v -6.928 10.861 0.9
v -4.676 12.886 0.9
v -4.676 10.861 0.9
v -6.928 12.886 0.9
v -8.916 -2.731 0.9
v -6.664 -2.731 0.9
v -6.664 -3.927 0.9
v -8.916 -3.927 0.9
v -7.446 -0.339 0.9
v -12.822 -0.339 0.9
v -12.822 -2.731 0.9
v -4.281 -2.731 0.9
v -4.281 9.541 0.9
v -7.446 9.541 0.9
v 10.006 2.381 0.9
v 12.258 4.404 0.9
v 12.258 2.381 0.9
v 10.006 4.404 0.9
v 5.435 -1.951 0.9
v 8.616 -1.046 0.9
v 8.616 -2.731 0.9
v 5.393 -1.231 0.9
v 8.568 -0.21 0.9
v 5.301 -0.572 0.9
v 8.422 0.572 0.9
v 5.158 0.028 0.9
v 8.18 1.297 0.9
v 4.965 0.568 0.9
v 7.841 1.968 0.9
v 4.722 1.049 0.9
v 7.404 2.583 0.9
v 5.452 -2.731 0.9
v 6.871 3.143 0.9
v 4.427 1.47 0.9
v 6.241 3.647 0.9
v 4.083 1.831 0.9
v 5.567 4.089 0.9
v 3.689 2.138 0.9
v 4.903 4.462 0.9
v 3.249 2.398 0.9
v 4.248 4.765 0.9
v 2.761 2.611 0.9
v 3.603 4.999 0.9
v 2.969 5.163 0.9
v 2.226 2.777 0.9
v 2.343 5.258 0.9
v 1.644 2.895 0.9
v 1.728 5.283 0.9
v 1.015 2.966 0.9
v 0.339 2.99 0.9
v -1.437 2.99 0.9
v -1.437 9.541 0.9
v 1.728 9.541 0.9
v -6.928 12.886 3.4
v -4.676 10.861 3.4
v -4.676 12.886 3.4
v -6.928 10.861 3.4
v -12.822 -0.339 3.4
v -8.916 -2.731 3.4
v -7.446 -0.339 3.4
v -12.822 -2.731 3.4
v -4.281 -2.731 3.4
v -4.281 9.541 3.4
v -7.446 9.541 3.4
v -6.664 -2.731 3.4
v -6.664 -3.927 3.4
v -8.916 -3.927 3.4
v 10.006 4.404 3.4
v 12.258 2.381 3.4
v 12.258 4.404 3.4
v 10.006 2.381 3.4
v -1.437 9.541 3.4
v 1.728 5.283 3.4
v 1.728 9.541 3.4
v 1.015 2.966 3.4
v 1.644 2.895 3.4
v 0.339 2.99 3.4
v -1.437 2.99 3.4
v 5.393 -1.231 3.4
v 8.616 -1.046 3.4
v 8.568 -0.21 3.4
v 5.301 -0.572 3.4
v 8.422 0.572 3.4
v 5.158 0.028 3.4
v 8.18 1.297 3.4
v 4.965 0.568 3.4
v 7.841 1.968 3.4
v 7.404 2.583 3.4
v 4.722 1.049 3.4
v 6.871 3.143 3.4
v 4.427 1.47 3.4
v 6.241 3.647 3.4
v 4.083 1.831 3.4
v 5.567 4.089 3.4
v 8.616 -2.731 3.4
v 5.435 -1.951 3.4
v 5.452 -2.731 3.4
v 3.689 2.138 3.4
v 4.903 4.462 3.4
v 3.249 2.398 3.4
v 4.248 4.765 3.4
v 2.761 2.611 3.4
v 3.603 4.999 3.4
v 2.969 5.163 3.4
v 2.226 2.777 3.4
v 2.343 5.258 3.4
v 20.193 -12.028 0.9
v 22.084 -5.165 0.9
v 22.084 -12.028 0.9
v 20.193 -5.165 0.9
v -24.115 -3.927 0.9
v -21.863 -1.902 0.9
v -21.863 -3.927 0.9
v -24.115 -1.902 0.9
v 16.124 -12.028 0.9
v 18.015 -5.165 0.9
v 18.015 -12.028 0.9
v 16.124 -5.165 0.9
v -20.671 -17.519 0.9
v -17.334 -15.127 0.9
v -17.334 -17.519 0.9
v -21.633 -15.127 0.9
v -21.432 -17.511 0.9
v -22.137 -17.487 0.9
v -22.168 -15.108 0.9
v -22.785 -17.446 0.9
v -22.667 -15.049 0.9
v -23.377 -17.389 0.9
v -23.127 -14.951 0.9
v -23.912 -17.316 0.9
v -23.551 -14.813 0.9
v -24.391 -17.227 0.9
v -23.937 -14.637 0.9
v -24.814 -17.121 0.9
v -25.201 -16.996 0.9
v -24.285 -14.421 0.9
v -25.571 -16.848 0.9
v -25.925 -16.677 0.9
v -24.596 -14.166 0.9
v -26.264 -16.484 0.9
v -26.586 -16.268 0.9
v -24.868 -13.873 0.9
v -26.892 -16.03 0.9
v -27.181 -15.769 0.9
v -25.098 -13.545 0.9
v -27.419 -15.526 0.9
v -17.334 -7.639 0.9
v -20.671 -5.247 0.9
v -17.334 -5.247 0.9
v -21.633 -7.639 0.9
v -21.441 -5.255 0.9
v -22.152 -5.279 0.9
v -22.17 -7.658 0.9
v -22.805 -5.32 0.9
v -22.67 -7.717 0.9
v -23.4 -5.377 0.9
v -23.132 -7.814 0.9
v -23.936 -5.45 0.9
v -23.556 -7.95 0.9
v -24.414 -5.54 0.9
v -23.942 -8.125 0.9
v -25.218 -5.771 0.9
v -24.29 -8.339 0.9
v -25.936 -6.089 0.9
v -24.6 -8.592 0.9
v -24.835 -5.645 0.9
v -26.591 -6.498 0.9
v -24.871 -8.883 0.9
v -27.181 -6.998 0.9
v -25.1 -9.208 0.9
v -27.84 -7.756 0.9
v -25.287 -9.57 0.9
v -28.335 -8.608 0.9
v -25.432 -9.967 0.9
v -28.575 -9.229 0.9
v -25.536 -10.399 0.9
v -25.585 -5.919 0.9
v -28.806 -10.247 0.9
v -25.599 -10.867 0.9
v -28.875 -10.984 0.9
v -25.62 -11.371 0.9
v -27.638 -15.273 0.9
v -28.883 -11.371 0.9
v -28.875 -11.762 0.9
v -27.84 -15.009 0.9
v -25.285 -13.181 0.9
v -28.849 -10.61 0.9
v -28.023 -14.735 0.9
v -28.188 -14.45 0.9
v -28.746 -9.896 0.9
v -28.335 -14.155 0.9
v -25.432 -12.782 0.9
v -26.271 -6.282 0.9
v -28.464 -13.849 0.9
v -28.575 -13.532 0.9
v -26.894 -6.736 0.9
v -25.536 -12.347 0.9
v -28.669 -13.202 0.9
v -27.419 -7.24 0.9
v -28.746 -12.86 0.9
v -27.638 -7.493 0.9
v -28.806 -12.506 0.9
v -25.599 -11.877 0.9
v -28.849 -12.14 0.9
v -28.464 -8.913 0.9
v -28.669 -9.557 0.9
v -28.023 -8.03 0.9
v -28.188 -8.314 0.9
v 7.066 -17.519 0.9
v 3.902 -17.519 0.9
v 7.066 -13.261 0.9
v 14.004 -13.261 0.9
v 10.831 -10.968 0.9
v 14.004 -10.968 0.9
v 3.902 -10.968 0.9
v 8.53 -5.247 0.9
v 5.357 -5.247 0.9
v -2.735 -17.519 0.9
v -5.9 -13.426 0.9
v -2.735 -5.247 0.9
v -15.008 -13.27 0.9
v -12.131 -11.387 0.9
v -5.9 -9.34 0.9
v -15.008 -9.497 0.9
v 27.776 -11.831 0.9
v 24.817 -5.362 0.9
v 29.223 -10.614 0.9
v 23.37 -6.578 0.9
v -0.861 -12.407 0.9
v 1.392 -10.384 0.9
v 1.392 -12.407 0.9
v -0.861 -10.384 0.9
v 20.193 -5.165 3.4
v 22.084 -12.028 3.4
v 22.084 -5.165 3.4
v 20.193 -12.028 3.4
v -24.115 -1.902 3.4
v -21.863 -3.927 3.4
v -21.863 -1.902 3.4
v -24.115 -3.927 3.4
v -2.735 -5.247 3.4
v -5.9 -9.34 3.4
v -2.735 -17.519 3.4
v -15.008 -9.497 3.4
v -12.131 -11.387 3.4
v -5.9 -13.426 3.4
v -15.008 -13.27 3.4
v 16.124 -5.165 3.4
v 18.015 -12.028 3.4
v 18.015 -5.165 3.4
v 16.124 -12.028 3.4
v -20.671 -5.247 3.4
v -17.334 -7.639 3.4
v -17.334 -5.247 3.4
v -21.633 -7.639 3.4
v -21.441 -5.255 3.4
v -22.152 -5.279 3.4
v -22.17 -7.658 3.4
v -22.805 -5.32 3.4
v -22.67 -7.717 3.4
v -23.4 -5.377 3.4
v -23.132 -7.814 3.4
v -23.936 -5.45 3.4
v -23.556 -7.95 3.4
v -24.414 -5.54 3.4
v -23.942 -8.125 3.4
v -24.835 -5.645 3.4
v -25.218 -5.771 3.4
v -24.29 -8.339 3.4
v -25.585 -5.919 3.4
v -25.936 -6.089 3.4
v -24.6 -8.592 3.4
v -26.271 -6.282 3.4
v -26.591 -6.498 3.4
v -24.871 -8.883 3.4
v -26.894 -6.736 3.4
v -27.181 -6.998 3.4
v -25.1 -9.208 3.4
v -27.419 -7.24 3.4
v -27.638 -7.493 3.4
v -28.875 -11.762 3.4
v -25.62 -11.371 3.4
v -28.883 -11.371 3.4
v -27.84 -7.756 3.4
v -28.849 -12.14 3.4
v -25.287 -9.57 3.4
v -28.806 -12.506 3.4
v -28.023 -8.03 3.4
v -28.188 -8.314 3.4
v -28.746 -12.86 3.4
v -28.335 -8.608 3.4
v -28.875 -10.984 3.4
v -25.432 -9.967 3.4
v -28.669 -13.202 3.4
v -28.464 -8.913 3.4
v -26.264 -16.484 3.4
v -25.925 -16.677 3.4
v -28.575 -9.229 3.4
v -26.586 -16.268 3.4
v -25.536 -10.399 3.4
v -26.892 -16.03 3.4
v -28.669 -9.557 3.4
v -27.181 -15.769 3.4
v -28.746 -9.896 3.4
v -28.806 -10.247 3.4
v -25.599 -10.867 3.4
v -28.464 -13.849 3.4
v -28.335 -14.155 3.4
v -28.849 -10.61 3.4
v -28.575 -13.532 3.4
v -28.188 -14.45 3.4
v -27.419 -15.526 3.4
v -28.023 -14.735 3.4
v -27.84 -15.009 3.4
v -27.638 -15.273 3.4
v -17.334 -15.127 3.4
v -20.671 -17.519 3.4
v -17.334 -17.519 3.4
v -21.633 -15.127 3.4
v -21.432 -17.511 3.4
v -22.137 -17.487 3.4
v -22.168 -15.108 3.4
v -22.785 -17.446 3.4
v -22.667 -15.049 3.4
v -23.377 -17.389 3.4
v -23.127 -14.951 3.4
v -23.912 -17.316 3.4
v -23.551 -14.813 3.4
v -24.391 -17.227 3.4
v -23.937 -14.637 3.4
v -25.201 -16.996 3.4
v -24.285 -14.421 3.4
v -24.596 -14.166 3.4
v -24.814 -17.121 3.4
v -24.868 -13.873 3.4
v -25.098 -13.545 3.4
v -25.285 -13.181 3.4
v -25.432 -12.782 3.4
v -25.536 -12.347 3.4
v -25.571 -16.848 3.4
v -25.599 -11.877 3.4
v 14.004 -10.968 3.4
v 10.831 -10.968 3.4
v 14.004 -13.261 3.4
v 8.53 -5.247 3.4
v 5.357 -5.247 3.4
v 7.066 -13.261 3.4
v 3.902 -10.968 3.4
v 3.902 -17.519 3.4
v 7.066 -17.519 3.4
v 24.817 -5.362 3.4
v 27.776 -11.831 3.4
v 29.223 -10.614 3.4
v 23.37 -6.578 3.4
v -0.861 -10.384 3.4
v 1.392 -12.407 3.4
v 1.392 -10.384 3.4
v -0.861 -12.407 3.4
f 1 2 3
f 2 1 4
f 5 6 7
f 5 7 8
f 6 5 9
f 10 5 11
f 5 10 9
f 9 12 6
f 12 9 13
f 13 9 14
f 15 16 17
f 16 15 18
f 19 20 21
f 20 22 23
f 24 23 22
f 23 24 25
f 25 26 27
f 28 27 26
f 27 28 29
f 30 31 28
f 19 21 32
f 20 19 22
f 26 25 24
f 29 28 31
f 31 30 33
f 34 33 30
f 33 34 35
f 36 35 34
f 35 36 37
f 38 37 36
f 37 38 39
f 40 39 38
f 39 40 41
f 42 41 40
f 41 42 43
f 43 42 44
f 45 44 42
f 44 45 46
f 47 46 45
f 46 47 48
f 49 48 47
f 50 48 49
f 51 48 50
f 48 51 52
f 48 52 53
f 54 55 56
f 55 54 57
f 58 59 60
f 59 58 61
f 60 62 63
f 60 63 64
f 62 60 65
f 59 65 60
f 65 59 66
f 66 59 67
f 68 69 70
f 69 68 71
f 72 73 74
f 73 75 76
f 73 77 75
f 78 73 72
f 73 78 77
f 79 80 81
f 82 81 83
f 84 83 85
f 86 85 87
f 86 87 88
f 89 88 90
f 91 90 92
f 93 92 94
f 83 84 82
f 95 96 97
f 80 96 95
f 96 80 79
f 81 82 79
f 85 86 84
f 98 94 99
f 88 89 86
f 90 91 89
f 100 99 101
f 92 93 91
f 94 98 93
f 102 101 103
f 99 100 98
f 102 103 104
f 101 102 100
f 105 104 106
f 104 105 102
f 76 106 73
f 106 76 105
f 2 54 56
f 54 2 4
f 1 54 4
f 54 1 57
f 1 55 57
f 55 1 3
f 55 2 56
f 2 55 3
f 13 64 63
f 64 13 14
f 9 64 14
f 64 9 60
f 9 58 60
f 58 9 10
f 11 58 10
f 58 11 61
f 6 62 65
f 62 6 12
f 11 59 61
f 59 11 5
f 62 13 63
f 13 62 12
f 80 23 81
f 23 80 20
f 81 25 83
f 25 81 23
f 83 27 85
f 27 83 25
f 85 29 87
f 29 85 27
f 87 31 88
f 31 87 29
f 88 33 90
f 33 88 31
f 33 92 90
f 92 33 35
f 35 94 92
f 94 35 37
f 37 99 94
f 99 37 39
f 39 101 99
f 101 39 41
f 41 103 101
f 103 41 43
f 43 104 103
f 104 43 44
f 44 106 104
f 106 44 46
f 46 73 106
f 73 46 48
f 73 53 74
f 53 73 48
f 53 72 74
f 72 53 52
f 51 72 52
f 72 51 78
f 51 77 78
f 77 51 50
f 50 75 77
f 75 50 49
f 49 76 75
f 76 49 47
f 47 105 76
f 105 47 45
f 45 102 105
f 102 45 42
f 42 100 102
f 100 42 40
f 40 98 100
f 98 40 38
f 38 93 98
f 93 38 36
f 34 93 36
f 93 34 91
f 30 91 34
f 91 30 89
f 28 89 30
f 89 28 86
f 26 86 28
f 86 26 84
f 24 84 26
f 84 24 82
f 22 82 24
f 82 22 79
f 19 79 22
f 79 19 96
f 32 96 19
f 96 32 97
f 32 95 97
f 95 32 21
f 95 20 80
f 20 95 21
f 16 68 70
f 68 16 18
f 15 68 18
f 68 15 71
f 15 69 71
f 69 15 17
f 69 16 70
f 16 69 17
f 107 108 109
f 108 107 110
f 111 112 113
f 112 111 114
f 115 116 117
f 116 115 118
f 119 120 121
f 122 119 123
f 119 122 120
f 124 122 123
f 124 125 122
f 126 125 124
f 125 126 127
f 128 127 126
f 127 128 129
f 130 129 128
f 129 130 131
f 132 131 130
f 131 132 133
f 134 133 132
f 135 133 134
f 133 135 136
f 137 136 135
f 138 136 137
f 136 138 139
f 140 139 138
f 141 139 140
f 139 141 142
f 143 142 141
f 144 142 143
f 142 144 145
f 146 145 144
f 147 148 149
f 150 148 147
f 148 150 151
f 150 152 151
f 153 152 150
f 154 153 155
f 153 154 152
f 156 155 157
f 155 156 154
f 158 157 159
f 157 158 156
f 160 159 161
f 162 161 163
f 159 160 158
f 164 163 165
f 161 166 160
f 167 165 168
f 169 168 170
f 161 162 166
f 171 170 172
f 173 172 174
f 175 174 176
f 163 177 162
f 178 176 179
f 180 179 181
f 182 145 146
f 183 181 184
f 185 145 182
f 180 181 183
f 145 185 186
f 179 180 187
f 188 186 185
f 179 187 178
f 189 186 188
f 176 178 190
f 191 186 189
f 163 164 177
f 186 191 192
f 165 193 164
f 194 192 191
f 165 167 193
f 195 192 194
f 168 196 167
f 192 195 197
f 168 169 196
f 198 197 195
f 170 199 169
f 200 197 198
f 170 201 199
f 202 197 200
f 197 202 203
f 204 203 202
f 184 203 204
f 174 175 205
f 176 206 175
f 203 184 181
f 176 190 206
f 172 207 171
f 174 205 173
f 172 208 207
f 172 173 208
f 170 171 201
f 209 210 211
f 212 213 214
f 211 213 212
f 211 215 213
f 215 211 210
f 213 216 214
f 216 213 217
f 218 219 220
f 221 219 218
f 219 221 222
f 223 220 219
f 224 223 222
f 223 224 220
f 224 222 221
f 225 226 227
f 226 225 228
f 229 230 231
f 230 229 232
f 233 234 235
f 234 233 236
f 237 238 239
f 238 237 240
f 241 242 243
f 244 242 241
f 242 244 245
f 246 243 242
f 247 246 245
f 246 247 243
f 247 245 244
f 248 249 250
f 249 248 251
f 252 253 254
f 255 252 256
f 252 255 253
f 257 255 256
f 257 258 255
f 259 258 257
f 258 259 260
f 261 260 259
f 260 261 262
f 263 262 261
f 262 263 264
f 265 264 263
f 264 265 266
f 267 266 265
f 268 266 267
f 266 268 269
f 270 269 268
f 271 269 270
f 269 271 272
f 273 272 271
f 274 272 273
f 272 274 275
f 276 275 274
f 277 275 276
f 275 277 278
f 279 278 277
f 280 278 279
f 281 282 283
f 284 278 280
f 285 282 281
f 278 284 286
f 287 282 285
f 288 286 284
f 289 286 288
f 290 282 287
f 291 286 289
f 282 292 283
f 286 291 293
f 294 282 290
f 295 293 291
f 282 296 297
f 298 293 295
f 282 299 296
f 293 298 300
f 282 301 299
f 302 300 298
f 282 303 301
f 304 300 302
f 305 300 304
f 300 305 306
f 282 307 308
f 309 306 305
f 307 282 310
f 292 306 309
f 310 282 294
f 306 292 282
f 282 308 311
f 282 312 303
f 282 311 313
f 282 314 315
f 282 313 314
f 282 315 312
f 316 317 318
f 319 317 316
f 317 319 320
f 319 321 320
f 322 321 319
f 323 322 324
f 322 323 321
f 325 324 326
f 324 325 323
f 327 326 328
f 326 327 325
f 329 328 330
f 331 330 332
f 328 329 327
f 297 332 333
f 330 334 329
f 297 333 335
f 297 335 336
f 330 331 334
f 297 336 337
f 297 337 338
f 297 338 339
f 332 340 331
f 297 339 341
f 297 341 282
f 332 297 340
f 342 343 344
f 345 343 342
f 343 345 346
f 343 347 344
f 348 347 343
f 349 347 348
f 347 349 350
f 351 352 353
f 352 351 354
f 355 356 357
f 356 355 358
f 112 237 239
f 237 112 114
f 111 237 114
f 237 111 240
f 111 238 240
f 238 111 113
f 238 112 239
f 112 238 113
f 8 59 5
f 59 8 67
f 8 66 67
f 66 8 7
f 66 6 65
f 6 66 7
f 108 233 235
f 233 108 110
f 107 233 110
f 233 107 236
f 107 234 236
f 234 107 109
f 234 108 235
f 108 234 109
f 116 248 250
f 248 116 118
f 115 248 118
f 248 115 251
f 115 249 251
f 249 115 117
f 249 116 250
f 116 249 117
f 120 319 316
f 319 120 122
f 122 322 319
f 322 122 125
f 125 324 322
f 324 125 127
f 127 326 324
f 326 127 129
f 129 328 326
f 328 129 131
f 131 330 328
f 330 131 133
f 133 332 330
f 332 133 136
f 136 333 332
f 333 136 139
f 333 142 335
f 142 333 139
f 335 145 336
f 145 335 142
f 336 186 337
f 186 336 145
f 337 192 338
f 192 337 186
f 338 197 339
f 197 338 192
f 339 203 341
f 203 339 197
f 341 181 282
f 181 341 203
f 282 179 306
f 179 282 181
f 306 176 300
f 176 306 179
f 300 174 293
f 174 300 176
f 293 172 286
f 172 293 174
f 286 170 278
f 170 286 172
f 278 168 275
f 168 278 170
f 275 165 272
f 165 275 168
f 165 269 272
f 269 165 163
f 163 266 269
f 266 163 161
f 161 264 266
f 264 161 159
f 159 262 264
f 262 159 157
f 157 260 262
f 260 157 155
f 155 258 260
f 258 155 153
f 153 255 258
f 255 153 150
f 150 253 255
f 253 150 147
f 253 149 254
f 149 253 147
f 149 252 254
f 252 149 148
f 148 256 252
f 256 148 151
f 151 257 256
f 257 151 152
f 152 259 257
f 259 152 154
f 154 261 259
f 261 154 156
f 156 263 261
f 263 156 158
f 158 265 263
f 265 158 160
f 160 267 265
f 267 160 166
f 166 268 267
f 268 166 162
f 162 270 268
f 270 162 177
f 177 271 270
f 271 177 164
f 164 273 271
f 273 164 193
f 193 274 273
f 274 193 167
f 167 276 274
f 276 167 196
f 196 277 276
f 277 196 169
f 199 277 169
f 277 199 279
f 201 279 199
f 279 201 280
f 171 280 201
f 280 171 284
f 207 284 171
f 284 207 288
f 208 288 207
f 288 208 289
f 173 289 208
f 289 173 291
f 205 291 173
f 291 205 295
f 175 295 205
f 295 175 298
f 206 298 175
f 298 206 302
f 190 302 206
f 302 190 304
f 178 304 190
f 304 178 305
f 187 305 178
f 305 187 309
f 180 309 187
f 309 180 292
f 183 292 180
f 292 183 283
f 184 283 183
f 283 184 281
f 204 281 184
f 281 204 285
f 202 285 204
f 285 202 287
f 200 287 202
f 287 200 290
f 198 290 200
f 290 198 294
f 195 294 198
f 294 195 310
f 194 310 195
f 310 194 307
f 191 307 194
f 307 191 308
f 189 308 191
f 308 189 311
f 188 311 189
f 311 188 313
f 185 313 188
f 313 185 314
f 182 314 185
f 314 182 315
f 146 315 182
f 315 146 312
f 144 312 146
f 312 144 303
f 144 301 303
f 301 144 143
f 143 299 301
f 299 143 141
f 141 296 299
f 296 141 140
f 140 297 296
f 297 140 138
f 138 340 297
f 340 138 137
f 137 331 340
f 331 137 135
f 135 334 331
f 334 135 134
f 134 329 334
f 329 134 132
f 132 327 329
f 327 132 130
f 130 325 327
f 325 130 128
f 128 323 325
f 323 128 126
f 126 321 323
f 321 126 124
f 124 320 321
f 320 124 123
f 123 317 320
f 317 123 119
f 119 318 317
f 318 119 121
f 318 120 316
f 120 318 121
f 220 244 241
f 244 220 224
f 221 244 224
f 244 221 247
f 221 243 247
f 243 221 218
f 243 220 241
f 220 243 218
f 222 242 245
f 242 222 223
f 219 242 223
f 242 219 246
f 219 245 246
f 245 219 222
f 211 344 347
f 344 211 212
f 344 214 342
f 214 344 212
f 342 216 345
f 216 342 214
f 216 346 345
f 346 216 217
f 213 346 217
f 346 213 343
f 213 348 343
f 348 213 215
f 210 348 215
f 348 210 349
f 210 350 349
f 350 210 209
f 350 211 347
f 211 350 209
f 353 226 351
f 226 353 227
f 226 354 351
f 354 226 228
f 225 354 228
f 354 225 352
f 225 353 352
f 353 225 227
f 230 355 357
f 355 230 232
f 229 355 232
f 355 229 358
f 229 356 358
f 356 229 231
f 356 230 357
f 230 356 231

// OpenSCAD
$fn = 48;
  // syllabics (overlaid on icon, tallest)
  translate([0, 4.894, 0.900]) linear_extrude(height=2.500) text("ᒨᔁ", size=12.122, halign="center", valign="center", font="Euphemia UCAS:style=Bold");
  translate([0, -9.894, 0.900]) linear_extrude(height=2.500) text("ᑖᐚᔨᐦᐠ", size=12.122, halign="center", valign="center", font="Euphemia UCAS:style=Bold");
